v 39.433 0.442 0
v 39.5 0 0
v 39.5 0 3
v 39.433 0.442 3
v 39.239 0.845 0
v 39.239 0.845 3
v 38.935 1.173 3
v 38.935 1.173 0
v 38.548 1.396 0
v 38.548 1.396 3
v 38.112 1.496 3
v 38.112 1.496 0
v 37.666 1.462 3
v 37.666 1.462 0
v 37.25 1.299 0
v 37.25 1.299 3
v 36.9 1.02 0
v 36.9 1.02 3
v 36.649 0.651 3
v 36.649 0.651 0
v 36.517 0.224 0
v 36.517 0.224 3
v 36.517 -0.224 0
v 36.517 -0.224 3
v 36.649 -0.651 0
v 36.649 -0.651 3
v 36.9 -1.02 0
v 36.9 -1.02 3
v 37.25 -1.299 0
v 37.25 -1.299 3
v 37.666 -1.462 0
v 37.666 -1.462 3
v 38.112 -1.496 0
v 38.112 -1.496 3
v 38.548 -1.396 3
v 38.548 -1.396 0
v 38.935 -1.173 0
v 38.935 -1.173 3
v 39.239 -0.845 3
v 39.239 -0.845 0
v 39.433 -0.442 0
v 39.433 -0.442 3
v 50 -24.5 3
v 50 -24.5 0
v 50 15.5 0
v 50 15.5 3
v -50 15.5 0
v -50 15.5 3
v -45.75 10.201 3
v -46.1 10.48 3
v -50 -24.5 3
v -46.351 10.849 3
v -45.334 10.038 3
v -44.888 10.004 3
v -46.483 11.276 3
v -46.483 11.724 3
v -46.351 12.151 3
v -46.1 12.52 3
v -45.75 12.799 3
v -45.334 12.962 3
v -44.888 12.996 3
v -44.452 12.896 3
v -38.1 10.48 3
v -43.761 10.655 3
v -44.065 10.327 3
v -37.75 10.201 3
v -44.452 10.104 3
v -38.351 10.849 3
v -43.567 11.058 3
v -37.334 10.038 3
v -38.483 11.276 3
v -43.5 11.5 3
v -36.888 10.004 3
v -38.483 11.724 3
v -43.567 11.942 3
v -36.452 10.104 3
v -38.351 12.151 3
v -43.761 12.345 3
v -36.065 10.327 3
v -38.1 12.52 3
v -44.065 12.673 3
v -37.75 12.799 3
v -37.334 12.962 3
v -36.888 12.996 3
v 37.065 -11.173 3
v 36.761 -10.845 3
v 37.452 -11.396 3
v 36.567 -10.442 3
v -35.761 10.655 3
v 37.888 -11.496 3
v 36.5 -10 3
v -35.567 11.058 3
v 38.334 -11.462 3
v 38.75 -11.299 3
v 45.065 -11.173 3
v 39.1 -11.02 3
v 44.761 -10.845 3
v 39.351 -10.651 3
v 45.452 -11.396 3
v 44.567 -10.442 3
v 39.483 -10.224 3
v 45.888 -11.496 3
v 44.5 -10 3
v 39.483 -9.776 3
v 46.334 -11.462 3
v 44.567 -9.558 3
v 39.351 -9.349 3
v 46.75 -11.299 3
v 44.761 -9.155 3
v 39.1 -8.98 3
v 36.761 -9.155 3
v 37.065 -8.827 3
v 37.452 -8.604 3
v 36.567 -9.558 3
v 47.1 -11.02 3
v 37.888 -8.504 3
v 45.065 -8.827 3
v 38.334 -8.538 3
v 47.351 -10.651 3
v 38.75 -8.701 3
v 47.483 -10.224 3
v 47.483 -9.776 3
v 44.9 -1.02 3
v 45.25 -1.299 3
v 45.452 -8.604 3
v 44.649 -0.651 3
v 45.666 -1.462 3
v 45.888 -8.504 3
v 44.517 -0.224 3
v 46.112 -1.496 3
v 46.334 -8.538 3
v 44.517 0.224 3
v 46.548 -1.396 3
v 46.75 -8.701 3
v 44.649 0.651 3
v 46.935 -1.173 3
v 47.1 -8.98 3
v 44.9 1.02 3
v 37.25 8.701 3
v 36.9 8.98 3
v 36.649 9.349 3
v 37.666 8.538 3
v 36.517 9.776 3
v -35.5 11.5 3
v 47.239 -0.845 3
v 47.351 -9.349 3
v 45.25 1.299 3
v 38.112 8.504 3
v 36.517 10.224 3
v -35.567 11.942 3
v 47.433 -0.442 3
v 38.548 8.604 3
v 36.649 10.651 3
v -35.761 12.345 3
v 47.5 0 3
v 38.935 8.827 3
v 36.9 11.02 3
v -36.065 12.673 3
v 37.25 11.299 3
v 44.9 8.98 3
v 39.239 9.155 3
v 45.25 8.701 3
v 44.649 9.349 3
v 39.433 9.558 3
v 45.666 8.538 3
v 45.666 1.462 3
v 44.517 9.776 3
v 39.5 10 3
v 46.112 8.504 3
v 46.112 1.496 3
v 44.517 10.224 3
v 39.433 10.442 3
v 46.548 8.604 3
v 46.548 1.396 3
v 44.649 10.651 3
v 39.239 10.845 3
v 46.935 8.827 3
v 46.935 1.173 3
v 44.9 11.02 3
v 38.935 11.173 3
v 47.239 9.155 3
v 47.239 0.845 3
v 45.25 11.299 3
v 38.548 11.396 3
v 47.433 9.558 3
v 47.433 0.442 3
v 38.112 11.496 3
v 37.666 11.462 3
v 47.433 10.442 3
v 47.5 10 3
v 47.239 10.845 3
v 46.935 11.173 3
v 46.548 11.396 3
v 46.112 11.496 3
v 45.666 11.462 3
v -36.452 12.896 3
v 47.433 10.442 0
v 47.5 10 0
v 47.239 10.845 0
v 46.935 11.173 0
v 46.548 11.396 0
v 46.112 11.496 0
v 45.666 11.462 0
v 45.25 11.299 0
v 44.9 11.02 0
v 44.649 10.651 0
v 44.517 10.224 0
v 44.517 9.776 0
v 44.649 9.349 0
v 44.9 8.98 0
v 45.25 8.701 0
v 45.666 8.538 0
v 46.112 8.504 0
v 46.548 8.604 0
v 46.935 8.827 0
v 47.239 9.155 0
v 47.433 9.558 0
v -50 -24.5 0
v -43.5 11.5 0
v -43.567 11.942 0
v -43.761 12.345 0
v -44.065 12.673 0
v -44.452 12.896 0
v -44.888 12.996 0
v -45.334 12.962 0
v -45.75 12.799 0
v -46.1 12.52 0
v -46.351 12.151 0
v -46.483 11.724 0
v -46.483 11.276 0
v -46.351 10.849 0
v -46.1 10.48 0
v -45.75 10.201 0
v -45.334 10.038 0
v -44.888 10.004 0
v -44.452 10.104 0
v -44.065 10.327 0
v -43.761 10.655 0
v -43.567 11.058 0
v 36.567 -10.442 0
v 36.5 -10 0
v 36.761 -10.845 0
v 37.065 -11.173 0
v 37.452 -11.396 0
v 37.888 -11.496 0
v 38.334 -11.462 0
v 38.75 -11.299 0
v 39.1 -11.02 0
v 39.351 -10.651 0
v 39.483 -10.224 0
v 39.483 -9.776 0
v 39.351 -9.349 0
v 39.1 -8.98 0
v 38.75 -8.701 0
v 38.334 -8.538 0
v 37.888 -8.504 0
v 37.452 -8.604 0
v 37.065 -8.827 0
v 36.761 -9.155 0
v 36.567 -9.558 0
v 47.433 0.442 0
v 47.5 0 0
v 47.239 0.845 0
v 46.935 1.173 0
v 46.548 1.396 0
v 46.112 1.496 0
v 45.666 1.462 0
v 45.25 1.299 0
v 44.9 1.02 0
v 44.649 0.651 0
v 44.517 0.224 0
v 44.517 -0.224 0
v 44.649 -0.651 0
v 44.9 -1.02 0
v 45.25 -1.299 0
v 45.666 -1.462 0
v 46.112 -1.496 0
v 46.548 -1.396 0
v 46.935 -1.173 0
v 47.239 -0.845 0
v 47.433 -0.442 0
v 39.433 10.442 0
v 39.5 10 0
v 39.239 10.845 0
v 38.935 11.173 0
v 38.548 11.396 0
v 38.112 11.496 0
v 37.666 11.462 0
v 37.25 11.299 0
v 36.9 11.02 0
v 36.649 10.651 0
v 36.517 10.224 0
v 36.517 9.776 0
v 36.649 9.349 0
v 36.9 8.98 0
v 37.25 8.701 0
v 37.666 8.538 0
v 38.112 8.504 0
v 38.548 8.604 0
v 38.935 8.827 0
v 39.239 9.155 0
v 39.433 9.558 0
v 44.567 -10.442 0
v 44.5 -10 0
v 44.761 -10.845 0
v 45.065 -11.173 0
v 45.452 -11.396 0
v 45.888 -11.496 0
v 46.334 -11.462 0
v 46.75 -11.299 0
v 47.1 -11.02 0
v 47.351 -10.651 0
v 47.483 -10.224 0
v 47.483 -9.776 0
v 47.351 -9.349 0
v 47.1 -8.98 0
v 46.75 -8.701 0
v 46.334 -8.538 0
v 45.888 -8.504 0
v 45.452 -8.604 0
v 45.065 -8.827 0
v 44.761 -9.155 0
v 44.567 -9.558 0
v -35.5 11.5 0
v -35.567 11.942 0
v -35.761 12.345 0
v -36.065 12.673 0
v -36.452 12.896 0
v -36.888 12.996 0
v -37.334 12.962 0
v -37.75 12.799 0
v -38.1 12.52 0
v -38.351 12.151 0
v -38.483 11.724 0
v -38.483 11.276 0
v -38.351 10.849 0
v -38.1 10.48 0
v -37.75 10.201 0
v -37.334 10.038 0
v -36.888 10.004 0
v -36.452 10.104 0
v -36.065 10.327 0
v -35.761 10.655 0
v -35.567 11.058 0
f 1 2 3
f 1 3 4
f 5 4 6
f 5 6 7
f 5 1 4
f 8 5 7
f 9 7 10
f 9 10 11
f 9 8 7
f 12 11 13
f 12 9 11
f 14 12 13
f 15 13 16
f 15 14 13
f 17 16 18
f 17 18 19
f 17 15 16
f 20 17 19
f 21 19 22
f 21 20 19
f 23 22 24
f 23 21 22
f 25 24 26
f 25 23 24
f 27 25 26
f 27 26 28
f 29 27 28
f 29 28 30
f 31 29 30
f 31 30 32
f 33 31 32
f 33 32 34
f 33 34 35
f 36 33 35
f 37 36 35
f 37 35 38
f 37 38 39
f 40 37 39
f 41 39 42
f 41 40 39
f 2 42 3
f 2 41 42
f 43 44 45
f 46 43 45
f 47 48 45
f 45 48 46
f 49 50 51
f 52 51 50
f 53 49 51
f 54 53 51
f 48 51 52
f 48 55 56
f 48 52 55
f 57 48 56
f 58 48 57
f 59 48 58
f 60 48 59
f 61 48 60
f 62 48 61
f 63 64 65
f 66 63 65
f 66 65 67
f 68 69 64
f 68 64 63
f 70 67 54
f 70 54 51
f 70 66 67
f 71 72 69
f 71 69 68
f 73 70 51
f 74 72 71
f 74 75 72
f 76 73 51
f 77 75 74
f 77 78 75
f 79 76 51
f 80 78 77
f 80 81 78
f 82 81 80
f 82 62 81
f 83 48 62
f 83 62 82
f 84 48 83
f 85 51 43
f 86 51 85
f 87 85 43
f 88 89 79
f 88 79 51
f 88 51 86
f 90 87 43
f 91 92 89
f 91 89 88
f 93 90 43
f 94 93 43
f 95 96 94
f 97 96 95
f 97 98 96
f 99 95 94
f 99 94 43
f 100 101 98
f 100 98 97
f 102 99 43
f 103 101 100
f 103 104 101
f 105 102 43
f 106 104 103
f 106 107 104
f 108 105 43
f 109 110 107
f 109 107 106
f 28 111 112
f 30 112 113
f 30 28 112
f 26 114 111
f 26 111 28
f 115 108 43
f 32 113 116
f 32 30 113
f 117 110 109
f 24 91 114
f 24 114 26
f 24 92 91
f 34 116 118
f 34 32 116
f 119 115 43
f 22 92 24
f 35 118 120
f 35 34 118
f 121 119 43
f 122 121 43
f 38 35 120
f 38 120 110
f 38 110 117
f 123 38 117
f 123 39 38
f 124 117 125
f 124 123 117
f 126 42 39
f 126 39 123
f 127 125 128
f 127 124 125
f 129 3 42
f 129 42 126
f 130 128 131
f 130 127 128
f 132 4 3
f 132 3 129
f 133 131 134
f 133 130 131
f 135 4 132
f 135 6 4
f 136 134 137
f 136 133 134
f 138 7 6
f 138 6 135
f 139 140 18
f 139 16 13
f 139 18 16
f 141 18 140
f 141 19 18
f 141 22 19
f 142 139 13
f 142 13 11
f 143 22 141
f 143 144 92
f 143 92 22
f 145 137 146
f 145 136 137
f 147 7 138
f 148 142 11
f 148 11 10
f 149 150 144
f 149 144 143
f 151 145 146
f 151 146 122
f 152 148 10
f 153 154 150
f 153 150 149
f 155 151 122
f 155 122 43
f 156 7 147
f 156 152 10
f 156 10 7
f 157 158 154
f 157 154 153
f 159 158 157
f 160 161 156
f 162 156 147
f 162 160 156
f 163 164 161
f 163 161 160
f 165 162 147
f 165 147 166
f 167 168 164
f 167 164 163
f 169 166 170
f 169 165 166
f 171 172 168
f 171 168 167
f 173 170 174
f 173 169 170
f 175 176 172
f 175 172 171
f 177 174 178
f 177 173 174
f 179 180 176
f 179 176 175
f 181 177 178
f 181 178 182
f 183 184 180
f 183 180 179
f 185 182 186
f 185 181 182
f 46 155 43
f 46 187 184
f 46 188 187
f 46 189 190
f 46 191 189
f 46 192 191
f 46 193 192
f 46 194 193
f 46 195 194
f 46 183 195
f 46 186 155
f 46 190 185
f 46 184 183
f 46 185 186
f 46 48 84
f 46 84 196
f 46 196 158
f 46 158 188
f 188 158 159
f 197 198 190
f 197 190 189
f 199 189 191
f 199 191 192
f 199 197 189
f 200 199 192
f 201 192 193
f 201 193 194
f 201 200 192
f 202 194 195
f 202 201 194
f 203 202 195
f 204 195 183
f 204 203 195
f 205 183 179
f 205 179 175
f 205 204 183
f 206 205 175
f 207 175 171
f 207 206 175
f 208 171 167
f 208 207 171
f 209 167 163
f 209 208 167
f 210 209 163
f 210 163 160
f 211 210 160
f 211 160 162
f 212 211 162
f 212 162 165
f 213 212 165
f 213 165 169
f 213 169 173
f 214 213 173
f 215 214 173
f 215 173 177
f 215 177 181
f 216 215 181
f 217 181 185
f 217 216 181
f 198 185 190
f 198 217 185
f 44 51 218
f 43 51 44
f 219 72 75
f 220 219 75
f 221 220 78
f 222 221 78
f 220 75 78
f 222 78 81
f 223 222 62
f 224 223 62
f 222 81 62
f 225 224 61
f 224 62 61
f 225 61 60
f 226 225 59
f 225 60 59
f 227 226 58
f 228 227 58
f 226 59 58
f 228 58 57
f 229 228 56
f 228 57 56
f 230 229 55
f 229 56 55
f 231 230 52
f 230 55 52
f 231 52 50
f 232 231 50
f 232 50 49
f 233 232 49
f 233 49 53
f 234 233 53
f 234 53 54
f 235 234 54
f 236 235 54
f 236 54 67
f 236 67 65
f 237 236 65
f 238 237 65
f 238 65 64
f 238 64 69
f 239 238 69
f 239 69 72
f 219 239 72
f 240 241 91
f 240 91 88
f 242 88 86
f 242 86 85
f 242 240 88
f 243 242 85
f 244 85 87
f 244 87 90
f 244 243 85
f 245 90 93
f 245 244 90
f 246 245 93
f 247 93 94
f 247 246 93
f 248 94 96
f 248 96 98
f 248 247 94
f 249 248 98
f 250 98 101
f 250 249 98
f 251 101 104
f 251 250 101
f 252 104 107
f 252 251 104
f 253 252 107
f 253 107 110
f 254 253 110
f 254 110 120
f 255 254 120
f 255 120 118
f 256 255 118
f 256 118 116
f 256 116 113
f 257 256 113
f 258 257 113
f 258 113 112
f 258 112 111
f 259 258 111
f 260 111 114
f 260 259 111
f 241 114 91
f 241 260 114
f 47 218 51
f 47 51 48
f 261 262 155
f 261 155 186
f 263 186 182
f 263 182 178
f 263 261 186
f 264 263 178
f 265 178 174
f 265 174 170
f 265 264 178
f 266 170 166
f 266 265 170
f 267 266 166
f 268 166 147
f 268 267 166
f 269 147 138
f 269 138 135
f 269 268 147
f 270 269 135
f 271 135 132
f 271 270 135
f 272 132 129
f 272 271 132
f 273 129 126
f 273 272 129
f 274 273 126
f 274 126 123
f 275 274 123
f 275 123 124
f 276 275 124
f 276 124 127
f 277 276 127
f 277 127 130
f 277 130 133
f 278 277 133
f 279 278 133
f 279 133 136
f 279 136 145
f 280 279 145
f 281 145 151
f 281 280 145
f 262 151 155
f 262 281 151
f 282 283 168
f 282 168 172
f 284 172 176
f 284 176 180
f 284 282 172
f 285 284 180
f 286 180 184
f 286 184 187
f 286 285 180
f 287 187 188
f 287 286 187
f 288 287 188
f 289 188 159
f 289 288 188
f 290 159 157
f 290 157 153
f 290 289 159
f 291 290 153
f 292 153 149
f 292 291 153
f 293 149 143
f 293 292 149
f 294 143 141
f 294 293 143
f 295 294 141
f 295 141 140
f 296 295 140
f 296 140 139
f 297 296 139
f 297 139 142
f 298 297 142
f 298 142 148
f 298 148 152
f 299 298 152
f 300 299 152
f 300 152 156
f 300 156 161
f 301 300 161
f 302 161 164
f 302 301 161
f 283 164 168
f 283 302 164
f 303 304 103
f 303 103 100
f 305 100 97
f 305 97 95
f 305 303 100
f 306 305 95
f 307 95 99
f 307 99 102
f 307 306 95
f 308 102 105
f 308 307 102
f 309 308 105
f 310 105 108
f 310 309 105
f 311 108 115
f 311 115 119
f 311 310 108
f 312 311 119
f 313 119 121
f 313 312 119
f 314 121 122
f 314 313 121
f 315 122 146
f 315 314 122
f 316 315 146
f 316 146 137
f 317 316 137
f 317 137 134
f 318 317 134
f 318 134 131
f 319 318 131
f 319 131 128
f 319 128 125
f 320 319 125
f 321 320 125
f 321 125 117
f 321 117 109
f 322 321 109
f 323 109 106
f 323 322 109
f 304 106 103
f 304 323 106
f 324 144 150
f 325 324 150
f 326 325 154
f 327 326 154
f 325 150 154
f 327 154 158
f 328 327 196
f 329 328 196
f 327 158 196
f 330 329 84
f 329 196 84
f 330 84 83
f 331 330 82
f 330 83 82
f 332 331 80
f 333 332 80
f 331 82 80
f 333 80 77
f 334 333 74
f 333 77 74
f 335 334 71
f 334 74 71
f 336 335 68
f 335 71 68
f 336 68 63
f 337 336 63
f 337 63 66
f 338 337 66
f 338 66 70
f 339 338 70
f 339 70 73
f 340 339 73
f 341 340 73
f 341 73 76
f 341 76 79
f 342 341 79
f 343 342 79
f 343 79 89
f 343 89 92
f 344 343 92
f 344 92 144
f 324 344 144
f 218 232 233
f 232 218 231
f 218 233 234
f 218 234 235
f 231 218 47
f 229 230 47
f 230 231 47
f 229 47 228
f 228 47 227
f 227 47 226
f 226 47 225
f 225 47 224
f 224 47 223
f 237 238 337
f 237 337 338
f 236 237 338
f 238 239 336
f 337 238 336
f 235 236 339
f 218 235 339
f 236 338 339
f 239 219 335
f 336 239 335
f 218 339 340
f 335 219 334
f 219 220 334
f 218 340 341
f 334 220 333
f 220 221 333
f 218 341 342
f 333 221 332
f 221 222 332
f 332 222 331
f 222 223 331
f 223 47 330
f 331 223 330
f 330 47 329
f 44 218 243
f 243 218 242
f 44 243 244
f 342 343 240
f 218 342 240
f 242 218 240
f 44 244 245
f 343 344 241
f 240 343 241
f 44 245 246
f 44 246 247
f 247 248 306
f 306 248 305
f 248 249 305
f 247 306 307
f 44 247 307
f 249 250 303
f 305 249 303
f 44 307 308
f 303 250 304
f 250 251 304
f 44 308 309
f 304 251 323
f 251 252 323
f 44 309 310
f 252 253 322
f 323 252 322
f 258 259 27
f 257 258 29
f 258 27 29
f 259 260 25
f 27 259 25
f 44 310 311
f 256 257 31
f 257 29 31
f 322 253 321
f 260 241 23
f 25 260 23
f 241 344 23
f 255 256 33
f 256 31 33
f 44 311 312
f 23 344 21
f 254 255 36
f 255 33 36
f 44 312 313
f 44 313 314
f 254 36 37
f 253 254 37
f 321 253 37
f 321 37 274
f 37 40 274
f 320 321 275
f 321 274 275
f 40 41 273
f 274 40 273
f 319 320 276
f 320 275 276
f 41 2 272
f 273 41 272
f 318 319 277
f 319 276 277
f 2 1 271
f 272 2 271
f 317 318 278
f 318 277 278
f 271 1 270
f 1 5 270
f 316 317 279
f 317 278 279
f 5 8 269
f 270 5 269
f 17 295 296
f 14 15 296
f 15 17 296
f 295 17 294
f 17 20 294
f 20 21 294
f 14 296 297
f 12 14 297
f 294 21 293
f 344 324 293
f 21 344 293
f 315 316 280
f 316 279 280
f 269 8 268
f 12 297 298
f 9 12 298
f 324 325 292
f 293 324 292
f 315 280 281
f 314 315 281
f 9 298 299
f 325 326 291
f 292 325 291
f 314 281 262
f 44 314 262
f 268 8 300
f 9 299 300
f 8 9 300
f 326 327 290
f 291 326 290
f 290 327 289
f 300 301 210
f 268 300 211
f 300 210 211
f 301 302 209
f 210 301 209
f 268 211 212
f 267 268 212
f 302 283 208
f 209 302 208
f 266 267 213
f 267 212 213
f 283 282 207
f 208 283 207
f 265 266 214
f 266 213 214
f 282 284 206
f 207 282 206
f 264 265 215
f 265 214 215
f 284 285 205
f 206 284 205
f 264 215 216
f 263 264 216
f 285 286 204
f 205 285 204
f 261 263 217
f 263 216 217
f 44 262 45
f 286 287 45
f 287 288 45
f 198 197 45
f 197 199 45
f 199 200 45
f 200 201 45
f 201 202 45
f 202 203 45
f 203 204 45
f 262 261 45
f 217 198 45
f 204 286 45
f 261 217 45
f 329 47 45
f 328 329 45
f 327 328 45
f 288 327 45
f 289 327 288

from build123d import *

# Parameters (mm, degrees)
SKETCH1_W           = 100
SKETCH1_H           = 55
SKETCH1_R           = 1.5
BOSS_EXTRUDE1_DEPTH = 3
SKETCH2_W           = 100
SKETCH2_H           = 12
CUT_EXTRUDE1_DEPTH  = 58.142366069
SKETCH3_W           = 100
SKETCH3_H           = 3
CUT_EXTRUDE2_DEPTH  = 58.142366069
SKETCH4_R           = 1.5
CUT_EXTRUDE3_DEPTH  = 56.760649207


with BuildPart() as part:
    # Sketch1 → Boss-Extrude1 (new body)
    with BuildSketch(Plane.XY):
        Rectangle(SKETCH1_W, SKETCH1_H)
        with Locations((38, 10)):
            Circle(SKETCH1_R, mode=Mode.SUBTRACT)
        with Locations((46, 10)):
            Circle(SKETCH1_R, mode=Mode.SUBTRACT)
        with Locations(Location((46, -10, 0), (0, 0, 180))):
            Circle(SKETCH1_R, mode=Mode.SUBTRACT)
        with Locations(Location((38, -10, 0), (0, 0, 180))):
            Circle(SKETCH1_R, mode=Mode.SUBTRACT)
        with Locations((38, 0)):
            Circle(SKETCH1_R, mode=Mode.SUBTRACT)
        with Locations((46, 0)):
            Circle(SKETCH1_R, mode=Mode.SUBTRACT)
    extrude(amount=BOSS_EXTRUDE1_DEPTH)

    # Sketch2 → Cut-Extrude1 (cut, through all)
    with BuildSketch(Plane.XY.offset(3)):
        with Locations((0, 21.5)):
            Rectangle(SKETCH2_W, SKETCH2_H)
    extrude(amount=-CUT_EXTRUDE1_DEPTH, mode=Mode.SUBTRACT)

    # Sketch3 → Cut-Extrude2 (cut, through all)
    with BuildSketch(Plane.XY.offset(3)):
        with Locations((0, -26)):
            Rectangle(SKETCH3_W, SKETCH3_H)
    extrude(amount=-CUT_EXTRUDE2_DEPTH, mode=Mode.SUBTRACT)

    # Sketch4 → Cut-Extrude3 (cut, through all)
    with BuildSketch(Plane.XY.offset(3)):
        with Locations((-45, 11.5)):
            Circle(SKETCH4_R)
        with Locations((-37, 11.5)):
            Circle(SKETCH4_R)
    extrude(amount=-CUT_EXTRUDE3_DEPTH, mode=Mode.SUBTRACT)


solid = part.part
